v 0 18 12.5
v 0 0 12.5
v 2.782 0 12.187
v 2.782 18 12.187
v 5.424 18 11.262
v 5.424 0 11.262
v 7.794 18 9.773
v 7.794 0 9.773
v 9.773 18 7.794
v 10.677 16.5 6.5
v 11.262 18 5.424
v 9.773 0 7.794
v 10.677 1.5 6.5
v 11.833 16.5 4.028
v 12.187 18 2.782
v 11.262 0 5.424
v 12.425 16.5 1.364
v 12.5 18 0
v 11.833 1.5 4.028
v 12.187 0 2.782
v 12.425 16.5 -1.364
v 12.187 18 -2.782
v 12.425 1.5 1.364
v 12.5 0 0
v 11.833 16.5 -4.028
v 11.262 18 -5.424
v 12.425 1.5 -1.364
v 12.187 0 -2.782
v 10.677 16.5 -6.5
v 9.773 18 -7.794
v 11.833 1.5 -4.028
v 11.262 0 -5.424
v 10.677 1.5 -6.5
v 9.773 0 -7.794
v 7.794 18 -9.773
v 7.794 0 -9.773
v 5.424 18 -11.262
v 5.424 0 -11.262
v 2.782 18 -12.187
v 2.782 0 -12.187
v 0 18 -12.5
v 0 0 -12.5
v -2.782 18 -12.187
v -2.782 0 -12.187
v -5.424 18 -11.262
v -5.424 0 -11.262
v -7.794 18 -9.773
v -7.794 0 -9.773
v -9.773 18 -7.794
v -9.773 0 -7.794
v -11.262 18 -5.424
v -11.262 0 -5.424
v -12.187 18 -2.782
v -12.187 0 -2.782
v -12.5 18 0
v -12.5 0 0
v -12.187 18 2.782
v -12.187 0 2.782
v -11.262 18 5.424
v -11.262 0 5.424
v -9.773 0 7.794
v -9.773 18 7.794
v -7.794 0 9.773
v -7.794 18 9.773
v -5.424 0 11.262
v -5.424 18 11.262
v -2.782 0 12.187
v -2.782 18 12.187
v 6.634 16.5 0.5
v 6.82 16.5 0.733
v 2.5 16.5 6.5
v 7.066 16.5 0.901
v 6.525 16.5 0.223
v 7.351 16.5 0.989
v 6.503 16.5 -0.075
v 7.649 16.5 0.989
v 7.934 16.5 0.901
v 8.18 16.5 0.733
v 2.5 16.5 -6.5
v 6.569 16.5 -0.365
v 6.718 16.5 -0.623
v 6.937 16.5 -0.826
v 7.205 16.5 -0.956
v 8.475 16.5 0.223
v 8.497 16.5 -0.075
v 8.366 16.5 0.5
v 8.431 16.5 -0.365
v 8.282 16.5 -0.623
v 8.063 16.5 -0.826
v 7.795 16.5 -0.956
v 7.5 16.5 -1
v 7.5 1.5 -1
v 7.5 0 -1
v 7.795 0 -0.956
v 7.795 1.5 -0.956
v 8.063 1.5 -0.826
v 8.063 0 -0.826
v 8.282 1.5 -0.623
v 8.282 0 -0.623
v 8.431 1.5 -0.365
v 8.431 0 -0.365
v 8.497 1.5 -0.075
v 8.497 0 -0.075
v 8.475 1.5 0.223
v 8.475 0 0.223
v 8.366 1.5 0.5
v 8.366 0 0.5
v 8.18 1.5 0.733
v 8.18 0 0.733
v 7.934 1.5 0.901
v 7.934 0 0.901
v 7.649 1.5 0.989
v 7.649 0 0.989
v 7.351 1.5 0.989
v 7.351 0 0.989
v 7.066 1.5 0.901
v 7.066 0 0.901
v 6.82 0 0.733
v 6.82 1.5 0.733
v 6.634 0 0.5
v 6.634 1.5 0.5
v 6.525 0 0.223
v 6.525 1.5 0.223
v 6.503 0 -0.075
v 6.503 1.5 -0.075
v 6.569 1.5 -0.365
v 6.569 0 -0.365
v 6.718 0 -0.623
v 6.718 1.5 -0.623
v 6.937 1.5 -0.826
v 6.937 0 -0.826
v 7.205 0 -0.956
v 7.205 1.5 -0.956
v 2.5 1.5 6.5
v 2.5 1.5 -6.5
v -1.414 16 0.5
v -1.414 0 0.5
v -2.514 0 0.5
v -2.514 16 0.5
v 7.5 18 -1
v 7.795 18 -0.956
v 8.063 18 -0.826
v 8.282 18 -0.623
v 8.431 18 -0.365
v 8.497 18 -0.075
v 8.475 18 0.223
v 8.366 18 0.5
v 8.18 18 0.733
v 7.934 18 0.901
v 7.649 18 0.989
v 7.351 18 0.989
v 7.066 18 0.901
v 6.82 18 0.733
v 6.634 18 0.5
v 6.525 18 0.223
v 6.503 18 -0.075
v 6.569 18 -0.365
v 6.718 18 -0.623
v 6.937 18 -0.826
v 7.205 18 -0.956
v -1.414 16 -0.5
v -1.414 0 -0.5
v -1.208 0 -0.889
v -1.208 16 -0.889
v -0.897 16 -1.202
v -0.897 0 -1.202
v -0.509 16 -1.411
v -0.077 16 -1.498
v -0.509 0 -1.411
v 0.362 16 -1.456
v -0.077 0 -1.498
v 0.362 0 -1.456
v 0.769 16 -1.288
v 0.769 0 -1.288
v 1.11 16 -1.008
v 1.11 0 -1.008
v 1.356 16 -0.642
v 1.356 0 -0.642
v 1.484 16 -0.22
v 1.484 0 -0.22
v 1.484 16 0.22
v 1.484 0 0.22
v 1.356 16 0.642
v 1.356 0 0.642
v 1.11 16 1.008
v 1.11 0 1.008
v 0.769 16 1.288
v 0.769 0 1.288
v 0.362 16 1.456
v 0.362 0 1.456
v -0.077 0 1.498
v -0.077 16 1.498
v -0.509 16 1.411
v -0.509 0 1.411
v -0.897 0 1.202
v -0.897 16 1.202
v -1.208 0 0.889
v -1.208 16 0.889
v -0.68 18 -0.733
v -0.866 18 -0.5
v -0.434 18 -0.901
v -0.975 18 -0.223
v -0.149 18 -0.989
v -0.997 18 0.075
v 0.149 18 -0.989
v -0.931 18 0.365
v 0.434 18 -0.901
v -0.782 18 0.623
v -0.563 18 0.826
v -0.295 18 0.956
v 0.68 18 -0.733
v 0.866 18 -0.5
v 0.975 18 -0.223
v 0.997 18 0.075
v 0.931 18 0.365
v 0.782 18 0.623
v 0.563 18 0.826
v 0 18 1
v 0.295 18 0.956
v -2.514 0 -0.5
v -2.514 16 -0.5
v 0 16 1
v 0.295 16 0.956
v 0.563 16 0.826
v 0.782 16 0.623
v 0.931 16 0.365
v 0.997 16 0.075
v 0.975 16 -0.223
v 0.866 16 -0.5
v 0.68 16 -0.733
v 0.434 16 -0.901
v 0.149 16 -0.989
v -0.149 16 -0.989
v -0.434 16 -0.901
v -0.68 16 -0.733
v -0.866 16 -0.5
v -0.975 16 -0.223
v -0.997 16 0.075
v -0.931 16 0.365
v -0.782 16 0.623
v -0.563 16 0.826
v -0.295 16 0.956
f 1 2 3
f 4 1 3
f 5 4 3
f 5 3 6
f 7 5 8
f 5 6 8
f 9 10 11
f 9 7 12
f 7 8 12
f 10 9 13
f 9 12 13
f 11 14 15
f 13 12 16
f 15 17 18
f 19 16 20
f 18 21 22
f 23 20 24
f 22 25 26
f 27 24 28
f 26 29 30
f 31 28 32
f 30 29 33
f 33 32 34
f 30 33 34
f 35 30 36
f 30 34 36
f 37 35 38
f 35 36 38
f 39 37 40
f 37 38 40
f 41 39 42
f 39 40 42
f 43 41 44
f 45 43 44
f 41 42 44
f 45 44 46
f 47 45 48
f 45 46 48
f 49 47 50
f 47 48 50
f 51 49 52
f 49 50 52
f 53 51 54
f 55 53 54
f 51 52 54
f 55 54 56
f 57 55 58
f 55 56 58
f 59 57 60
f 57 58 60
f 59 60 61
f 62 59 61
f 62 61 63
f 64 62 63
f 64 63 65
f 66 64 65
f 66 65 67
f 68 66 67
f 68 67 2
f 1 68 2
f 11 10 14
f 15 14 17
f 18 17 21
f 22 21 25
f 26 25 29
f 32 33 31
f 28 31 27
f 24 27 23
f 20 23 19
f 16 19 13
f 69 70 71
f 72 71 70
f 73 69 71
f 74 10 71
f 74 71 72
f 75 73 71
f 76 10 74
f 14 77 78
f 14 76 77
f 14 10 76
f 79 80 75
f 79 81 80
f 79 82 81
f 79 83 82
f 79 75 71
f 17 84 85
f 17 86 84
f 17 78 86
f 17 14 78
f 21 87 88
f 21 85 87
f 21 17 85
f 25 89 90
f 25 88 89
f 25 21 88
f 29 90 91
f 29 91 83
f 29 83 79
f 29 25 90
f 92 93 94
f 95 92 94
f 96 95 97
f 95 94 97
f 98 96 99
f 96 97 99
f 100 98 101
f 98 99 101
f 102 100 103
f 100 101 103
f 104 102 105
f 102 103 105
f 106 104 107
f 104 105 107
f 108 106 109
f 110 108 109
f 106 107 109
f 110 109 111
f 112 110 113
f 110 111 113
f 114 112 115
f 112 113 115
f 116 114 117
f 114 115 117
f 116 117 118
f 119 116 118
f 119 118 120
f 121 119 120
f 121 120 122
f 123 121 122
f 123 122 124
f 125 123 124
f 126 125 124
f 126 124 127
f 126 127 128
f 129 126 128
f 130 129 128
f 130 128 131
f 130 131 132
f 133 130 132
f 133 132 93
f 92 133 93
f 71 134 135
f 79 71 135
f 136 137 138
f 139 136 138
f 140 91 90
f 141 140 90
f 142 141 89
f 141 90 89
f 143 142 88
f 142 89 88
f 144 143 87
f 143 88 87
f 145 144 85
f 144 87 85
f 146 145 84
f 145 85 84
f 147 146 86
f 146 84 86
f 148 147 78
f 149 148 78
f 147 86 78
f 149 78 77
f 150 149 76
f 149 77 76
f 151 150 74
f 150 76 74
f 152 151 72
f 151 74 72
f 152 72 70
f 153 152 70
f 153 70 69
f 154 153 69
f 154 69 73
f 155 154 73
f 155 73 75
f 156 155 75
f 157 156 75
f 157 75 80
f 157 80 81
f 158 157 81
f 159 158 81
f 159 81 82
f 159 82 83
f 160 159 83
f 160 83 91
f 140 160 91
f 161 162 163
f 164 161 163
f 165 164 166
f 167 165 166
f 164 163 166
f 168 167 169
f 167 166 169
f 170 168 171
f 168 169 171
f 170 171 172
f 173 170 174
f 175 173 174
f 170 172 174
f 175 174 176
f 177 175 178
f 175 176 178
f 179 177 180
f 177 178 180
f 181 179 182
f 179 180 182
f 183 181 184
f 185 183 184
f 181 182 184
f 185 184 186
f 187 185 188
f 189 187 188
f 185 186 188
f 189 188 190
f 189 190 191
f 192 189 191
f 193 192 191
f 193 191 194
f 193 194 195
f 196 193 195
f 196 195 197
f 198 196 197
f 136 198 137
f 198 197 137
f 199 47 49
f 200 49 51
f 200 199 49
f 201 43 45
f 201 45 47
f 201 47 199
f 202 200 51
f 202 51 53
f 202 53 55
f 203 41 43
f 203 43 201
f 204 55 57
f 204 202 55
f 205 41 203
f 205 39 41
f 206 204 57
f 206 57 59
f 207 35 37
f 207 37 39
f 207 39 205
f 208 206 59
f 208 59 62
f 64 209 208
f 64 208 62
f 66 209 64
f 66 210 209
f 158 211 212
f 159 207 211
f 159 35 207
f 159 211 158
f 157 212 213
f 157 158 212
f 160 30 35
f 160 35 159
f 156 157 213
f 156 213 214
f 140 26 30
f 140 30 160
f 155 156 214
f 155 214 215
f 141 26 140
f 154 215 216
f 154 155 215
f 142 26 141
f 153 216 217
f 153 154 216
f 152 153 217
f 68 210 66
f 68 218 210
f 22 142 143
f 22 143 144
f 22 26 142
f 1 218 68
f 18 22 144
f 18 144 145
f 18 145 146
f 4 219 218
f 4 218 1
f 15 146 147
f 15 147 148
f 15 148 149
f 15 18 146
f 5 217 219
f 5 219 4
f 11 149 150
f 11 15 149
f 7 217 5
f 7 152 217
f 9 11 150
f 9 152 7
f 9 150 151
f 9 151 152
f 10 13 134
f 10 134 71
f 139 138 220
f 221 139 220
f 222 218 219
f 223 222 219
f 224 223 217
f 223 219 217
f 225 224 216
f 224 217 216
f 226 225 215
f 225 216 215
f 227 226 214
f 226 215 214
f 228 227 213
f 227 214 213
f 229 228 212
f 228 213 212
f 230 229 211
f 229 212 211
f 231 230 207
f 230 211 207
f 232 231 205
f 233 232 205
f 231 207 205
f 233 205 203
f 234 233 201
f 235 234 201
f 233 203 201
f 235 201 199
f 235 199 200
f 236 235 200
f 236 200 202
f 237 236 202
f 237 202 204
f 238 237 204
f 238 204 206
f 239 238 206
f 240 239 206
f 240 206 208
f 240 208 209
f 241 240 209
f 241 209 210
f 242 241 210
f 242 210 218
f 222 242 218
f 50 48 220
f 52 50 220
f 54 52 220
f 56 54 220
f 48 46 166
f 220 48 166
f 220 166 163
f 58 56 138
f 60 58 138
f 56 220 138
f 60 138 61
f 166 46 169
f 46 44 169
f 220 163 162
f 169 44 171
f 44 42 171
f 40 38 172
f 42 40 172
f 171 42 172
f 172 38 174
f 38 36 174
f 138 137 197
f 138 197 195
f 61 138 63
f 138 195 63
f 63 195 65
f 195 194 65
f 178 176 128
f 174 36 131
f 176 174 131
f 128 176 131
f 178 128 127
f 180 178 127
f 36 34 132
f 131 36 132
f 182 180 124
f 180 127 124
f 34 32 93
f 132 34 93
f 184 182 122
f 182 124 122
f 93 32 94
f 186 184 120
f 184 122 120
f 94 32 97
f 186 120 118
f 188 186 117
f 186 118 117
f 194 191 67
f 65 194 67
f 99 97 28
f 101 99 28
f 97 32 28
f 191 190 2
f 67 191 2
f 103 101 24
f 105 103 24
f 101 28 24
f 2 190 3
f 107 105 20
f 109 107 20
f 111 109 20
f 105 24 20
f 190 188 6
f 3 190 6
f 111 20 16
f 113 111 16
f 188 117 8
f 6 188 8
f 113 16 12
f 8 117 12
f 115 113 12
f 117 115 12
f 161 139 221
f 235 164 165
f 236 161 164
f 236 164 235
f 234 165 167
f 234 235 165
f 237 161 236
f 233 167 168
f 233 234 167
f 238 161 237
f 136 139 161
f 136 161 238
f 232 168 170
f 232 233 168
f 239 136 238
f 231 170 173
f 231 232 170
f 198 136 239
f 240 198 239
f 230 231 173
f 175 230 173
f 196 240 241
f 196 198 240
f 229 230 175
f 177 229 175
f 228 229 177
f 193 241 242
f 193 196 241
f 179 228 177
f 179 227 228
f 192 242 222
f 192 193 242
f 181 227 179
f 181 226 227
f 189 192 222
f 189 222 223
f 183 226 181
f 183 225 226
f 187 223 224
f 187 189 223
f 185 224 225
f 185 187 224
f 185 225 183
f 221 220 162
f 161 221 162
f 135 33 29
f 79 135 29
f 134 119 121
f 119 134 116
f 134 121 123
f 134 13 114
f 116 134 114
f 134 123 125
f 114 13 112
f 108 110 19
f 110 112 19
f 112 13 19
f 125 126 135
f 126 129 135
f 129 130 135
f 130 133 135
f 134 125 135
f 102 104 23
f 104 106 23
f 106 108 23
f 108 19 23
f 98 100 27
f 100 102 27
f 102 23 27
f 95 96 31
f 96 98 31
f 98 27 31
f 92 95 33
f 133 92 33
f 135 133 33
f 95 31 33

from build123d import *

# Parameters (mm, degrees)
SKETCH1_R           = 12.5
BOSS_EXTRUDE1_DEPTH = 18
SKETCH3_R           = 1
CUT_EXTRUDE2_DEPTH  = 26.228951623
SKETCH6_W           = 13
SKETCH6_H           = 15
CUT_EXTRUDE3_DEPTH  = 10
CUT_EXTRUDE4_DEPTH  = 16
SKETCH7_R           = 1
CUT_EXTRUDE5_DEPTH  = 16


with BuildPart() as part:
    # Sketch1 → Boss-Extrude1 (new body)
    with BuildSketch(Plane(origin=(0, 0, 0), x_dir=(1, 0, 0), z_dir=(0, 1, 0))):
        with Locations(Location((0, 0, 0), (0, 0, 270))):
            Circle(SKETCH1_R)
    extrude(amount=BOSS_EXTRUDE1_DEPTH)

    # Sketch3 → Cut-Extrude2 (cut, through all)
    with BuildSketch(Plane.XZ):
        with Locations(Location((7.5, 0, 0), (0, 0, 270))):
            Circle(SKETCH3_R)
    extrude(amount=-CUT_EXTRUDE2_DEPTH, mode=Mode.SUBTRACT)

    # Sketch6 → Cut-Extrude3 (cut)
    with BuildSketch(Plane(origin=(12.5, 0, 0), x_dir=(0, 0, -1), z_dir=(1, 0, 0))):
        with Locations((0, 9)):
            Rectangle(SKETCH6_W, SKETCH6_H)
    extrude(amount=-CUT_EXTRUDE3_DEPTH, mode=Mode.SUBTRACT)

    # Sketch5 → Cut-Extrude4 (cut)
    with BuildSketch(Plane.XZ):
        with BuildLine():
            Line((-1.414213562, 0.5), (-2.514213562, 0.5))
            Line((-2.514213562, 0.5), (-2.514213562, -0.5))
            Line((-2.514213562, -0.5), (-1.414213562, -0.5))
            ThreePointArc((-1.414213562, -0.5), (1.5, 0), (-1.414213562, 0.5))
        make_face()
    extrude(amount=-CUT_EXTRUDE4_DEPTH, mode=Mode.SUBTRACT)

    # Sketch7 → Cut-Extrude5 (cut)
    with BuildSketch(Plane(origin=(0, 18, 0), x_dir=(1, 0, 0), z_dir=(0, 1, 0))):
        with Locations(Location((0, 0, 0), (0, 0, 270))):
            Circle(SKETCH7_R)
    extrude(amount=-CUT_EXTRUDE5_DEPTH, mode=Mode.SUBTRACT)


solid = part.part
